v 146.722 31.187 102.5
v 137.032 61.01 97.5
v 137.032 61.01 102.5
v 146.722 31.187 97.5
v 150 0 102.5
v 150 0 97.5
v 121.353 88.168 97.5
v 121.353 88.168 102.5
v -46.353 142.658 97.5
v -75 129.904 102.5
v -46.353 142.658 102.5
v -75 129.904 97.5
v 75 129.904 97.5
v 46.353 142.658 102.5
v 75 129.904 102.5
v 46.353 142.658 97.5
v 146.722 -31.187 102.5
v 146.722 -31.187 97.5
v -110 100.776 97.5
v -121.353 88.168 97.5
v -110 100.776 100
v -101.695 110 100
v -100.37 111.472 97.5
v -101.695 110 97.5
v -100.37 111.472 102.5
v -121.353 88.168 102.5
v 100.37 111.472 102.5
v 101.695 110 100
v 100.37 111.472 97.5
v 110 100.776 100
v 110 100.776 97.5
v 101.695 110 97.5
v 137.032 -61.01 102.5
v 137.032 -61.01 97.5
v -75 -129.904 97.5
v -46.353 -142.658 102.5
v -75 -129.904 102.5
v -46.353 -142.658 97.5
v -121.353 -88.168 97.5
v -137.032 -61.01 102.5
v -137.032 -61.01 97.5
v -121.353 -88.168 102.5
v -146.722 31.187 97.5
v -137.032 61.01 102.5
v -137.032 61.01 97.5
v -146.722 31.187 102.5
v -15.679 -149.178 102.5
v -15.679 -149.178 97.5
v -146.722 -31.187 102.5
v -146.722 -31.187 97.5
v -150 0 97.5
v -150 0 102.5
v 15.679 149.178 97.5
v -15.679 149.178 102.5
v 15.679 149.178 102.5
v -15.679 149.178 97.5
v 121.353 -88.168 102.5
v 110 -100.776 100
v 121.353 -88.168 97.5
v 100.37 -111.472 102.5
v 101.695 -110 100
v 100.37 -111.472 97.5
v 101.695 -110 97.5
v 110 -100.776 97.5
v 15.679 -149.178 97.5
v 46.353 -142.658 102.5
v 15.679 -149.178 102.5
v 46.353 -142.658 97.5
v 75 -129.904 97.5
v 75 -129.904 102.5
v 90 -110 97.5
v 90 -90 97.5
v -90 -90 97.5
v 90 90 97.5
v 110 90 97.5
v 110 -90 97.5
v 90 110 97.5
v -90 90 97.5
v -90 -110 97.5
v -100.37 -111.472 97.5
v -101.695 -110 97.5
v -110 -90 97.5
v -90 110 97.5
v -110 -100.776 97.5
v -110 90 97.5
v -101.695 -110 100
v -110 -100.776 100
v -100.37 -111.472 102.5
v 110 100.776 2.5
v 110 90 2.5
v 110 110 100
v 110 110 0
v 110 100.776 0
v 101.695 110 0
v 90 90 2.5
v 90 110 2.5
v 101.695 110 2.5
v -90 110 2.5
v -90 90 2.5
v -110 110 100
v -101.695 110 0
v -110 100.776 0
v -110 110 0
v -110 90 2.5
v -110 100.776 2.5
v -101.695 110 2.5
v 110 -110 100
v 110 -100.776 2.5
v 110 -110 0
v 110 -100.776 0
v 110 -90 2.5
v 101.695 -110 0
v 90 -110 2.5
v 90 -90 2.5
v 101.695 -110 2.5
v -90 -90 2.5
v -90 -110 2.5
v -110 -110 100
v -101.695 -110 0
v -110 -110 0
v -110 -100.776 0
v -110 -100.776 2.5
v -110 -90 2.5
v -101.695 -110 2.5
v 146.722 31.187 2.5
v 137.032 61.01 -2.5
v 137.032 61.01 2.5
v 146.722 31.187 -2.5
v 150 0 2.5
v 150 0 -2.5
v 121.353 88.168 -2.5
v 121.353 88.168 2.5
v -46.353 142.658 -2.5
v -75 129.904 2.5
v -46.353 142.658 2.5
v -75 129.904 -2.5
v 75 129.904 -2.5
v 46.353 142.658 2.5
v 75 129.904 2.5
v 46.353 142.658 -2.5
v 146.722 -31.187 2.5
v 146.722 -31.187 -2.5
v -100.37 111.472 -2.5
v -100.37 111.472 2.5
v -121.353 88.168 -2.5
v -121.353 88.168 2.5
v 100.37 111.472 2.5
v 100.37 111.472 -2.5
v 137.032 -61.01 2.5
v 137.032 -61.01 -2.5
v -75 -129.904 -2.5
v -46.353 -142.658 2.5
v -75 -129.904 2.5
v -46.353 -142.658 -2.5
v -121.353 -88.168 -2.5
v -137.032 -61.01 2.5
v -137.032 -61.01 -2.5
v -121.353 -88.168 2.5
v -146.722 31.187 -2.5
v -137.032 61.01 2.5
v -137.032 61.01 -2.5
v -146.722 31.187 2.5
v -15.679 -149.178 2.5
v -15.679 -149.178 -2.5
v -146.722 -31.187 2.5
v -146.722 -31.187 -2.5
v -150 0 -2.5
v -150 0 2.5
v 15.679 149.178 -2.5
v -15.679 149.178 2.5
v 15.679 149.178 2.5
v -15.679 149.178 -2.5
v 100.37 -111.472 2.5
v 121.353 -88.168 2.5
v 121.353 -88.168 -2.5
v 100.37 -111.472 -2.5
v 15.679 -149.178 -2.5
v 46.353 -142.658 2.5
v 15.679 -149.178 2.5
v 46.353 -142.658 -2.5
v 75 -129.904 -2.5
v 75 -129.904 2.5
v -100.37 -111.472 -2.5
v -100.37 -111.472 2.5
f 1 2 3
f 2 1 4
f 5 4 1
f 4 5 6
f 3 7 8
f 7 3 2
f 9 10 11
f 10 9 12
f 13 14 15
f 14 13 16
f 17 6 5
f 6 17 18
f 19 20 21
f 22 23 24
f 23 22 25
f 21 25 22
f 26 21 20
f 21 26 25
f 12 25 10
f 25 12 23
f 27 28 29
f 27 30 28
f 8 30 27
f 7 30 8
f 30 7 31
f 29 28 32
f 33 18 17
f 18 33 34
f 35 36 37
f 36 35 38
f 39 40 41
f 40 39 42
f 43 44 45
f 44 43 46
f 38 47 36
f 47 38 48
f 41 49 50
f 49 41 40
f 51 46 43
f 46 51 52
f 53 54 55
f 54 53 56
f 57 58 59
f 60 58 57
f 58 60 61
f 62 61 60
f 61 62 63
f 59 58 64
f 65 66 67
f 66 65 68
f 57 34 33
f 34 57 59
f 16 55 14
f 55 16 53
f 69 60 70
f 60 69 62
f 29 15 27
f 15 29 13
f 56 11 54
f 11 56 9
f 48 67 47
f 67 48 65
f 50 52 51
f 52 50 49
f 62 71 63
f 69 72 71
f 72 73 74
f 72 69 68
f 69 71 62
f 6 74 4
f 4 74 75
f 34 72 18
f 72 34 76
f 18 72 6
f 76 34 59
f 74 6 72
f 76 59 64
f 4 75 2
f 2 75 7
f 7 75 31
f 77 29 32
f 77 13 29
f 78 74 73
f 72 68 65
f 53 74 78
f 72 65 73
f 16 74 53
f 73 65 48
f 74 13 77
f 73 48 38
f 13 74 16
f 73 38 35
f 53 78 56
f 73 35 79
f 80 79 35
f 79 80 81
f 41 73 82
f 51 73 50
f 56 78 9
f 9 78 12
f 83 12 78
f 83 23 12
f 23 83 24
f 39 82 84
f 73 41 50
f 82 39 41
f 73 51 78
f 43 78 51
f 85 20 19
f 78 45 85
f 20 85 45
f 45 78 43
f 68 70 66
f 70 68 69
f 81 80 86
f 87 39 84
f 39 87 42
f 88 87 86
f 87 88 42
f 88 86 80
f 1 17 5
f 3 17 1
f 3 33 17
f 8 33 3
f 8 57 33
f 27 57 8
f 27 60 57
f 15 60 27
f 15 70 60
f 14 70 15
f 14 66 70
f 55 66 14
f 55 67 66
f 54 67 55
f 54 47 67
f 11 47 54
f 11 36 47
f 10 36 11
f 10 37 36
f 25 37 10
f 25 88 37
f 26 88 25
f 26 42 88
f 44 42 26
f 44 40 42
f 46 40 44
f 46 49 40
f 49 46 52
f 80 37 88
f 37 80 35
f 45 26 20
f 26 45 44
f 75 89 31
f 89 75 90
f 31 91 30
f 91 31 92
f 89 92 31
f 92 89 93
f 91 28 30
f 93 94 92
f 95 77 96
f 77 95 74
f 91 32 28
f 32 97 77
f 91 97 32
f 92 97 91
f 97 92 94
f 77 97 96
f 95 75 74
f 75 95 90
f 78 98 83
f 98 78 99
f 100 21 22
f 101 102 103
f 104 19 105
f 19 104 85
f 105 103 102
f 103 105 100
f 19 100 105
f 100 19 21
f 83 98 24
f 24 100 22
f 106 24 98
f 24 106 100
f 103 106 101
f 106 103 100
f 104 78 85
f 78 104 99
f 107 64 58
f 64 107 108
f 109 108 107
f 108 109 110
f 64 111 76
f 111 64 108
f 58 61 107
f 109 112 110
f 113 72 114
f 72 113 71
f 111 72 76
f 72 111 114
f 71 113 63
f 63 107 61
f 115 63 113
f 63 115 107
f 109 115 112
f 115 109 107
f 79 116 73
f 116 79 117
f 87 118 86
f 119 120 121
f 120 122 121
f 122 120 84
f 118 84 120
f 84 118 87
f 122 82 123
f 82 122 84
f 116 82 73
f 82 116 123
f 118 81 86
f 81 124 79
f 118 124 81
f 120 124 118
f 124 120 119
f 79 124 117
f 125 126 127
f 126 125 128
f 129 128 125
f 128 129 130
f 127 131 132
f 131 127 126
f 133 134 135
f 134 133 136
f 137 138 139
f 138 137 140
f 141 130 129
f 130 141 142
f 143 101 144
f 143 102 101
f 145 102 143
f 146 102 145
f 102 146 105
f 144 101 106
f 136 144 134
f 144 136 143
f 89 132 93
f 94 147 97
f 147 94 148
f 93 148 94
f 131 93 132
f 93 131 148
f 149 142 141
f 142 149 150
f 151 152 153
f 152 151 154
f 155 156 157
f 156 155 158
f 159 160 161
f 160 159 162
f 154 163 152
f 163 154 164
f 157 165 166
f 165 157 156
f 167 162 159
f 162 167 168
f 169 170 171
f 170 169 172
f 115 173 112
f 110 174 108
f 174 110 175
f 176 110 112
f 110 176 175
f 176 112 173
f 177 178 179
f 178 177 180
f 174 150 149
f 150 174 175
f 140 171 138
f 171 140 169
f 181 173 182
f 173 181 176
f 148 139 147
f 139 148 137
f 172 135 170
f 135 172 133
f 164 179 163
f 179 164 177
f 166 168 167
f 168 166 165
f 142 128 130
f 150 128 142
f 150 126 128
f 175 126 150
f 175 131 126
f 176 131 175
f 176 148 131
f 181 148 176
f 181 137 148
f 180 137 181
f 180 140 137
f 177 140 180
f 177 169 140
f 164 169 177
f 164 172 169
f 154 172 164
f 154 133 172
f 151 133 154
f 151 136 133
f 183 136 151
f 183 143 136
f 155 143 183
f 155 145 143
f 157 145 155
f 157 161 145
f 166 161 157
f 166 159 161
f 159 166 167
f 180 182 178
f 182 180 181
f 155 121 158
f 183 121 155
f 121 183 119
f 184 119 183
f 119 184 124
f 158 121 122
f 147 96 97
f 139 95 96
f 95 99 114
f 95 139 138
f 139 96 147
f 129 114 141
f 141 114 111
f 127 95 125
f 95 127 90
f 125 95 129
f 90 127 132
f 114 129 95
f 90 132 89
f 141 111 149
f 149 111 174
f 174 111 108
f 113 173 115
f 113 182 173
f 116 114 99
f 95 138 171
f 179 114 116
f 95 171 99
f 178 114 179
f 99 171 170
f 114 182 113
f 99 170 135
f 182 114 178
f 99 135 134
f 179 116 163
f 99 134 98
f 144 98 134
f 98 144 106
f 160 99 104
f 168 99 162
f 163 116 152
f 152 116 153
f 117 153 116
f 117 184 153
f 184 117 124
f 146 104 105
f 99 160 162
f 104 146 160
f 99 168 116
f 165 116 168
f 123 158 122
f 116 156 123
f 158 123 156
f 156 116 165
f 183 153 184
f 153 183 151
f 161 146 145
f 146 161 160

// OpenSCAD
// Model for the body of the robot

module first_level() {
  cylinder(r=150, h=5, center=true);
  // Add gearmotors and wheels
  // Add motor controller
  // Add battery
}

module second_level() {
  cylinder(r=150, h=5, center=true);
  // Second level supports, make these with a real 2020 extrusion profile
  translate([100, 100, -50]) cube([20, 20, 100], center=true);
  translate([-100, 100, -50]) cube([20, 20, 100], center=true);
  translate([100, -100, -50]) cube([20, 20, 100], center=true);
  translate([-100, -100, -50]) cube([20, 20, 100], center=true);
}

module monitor_mount() {

}

module gear_motors() {

}

module motor_controller() {

}

module battery() {

}

module raspberry_pi() {

}

module monitor_stand() {

}

first_level();
translate([0, 0, 100]) second_level();
